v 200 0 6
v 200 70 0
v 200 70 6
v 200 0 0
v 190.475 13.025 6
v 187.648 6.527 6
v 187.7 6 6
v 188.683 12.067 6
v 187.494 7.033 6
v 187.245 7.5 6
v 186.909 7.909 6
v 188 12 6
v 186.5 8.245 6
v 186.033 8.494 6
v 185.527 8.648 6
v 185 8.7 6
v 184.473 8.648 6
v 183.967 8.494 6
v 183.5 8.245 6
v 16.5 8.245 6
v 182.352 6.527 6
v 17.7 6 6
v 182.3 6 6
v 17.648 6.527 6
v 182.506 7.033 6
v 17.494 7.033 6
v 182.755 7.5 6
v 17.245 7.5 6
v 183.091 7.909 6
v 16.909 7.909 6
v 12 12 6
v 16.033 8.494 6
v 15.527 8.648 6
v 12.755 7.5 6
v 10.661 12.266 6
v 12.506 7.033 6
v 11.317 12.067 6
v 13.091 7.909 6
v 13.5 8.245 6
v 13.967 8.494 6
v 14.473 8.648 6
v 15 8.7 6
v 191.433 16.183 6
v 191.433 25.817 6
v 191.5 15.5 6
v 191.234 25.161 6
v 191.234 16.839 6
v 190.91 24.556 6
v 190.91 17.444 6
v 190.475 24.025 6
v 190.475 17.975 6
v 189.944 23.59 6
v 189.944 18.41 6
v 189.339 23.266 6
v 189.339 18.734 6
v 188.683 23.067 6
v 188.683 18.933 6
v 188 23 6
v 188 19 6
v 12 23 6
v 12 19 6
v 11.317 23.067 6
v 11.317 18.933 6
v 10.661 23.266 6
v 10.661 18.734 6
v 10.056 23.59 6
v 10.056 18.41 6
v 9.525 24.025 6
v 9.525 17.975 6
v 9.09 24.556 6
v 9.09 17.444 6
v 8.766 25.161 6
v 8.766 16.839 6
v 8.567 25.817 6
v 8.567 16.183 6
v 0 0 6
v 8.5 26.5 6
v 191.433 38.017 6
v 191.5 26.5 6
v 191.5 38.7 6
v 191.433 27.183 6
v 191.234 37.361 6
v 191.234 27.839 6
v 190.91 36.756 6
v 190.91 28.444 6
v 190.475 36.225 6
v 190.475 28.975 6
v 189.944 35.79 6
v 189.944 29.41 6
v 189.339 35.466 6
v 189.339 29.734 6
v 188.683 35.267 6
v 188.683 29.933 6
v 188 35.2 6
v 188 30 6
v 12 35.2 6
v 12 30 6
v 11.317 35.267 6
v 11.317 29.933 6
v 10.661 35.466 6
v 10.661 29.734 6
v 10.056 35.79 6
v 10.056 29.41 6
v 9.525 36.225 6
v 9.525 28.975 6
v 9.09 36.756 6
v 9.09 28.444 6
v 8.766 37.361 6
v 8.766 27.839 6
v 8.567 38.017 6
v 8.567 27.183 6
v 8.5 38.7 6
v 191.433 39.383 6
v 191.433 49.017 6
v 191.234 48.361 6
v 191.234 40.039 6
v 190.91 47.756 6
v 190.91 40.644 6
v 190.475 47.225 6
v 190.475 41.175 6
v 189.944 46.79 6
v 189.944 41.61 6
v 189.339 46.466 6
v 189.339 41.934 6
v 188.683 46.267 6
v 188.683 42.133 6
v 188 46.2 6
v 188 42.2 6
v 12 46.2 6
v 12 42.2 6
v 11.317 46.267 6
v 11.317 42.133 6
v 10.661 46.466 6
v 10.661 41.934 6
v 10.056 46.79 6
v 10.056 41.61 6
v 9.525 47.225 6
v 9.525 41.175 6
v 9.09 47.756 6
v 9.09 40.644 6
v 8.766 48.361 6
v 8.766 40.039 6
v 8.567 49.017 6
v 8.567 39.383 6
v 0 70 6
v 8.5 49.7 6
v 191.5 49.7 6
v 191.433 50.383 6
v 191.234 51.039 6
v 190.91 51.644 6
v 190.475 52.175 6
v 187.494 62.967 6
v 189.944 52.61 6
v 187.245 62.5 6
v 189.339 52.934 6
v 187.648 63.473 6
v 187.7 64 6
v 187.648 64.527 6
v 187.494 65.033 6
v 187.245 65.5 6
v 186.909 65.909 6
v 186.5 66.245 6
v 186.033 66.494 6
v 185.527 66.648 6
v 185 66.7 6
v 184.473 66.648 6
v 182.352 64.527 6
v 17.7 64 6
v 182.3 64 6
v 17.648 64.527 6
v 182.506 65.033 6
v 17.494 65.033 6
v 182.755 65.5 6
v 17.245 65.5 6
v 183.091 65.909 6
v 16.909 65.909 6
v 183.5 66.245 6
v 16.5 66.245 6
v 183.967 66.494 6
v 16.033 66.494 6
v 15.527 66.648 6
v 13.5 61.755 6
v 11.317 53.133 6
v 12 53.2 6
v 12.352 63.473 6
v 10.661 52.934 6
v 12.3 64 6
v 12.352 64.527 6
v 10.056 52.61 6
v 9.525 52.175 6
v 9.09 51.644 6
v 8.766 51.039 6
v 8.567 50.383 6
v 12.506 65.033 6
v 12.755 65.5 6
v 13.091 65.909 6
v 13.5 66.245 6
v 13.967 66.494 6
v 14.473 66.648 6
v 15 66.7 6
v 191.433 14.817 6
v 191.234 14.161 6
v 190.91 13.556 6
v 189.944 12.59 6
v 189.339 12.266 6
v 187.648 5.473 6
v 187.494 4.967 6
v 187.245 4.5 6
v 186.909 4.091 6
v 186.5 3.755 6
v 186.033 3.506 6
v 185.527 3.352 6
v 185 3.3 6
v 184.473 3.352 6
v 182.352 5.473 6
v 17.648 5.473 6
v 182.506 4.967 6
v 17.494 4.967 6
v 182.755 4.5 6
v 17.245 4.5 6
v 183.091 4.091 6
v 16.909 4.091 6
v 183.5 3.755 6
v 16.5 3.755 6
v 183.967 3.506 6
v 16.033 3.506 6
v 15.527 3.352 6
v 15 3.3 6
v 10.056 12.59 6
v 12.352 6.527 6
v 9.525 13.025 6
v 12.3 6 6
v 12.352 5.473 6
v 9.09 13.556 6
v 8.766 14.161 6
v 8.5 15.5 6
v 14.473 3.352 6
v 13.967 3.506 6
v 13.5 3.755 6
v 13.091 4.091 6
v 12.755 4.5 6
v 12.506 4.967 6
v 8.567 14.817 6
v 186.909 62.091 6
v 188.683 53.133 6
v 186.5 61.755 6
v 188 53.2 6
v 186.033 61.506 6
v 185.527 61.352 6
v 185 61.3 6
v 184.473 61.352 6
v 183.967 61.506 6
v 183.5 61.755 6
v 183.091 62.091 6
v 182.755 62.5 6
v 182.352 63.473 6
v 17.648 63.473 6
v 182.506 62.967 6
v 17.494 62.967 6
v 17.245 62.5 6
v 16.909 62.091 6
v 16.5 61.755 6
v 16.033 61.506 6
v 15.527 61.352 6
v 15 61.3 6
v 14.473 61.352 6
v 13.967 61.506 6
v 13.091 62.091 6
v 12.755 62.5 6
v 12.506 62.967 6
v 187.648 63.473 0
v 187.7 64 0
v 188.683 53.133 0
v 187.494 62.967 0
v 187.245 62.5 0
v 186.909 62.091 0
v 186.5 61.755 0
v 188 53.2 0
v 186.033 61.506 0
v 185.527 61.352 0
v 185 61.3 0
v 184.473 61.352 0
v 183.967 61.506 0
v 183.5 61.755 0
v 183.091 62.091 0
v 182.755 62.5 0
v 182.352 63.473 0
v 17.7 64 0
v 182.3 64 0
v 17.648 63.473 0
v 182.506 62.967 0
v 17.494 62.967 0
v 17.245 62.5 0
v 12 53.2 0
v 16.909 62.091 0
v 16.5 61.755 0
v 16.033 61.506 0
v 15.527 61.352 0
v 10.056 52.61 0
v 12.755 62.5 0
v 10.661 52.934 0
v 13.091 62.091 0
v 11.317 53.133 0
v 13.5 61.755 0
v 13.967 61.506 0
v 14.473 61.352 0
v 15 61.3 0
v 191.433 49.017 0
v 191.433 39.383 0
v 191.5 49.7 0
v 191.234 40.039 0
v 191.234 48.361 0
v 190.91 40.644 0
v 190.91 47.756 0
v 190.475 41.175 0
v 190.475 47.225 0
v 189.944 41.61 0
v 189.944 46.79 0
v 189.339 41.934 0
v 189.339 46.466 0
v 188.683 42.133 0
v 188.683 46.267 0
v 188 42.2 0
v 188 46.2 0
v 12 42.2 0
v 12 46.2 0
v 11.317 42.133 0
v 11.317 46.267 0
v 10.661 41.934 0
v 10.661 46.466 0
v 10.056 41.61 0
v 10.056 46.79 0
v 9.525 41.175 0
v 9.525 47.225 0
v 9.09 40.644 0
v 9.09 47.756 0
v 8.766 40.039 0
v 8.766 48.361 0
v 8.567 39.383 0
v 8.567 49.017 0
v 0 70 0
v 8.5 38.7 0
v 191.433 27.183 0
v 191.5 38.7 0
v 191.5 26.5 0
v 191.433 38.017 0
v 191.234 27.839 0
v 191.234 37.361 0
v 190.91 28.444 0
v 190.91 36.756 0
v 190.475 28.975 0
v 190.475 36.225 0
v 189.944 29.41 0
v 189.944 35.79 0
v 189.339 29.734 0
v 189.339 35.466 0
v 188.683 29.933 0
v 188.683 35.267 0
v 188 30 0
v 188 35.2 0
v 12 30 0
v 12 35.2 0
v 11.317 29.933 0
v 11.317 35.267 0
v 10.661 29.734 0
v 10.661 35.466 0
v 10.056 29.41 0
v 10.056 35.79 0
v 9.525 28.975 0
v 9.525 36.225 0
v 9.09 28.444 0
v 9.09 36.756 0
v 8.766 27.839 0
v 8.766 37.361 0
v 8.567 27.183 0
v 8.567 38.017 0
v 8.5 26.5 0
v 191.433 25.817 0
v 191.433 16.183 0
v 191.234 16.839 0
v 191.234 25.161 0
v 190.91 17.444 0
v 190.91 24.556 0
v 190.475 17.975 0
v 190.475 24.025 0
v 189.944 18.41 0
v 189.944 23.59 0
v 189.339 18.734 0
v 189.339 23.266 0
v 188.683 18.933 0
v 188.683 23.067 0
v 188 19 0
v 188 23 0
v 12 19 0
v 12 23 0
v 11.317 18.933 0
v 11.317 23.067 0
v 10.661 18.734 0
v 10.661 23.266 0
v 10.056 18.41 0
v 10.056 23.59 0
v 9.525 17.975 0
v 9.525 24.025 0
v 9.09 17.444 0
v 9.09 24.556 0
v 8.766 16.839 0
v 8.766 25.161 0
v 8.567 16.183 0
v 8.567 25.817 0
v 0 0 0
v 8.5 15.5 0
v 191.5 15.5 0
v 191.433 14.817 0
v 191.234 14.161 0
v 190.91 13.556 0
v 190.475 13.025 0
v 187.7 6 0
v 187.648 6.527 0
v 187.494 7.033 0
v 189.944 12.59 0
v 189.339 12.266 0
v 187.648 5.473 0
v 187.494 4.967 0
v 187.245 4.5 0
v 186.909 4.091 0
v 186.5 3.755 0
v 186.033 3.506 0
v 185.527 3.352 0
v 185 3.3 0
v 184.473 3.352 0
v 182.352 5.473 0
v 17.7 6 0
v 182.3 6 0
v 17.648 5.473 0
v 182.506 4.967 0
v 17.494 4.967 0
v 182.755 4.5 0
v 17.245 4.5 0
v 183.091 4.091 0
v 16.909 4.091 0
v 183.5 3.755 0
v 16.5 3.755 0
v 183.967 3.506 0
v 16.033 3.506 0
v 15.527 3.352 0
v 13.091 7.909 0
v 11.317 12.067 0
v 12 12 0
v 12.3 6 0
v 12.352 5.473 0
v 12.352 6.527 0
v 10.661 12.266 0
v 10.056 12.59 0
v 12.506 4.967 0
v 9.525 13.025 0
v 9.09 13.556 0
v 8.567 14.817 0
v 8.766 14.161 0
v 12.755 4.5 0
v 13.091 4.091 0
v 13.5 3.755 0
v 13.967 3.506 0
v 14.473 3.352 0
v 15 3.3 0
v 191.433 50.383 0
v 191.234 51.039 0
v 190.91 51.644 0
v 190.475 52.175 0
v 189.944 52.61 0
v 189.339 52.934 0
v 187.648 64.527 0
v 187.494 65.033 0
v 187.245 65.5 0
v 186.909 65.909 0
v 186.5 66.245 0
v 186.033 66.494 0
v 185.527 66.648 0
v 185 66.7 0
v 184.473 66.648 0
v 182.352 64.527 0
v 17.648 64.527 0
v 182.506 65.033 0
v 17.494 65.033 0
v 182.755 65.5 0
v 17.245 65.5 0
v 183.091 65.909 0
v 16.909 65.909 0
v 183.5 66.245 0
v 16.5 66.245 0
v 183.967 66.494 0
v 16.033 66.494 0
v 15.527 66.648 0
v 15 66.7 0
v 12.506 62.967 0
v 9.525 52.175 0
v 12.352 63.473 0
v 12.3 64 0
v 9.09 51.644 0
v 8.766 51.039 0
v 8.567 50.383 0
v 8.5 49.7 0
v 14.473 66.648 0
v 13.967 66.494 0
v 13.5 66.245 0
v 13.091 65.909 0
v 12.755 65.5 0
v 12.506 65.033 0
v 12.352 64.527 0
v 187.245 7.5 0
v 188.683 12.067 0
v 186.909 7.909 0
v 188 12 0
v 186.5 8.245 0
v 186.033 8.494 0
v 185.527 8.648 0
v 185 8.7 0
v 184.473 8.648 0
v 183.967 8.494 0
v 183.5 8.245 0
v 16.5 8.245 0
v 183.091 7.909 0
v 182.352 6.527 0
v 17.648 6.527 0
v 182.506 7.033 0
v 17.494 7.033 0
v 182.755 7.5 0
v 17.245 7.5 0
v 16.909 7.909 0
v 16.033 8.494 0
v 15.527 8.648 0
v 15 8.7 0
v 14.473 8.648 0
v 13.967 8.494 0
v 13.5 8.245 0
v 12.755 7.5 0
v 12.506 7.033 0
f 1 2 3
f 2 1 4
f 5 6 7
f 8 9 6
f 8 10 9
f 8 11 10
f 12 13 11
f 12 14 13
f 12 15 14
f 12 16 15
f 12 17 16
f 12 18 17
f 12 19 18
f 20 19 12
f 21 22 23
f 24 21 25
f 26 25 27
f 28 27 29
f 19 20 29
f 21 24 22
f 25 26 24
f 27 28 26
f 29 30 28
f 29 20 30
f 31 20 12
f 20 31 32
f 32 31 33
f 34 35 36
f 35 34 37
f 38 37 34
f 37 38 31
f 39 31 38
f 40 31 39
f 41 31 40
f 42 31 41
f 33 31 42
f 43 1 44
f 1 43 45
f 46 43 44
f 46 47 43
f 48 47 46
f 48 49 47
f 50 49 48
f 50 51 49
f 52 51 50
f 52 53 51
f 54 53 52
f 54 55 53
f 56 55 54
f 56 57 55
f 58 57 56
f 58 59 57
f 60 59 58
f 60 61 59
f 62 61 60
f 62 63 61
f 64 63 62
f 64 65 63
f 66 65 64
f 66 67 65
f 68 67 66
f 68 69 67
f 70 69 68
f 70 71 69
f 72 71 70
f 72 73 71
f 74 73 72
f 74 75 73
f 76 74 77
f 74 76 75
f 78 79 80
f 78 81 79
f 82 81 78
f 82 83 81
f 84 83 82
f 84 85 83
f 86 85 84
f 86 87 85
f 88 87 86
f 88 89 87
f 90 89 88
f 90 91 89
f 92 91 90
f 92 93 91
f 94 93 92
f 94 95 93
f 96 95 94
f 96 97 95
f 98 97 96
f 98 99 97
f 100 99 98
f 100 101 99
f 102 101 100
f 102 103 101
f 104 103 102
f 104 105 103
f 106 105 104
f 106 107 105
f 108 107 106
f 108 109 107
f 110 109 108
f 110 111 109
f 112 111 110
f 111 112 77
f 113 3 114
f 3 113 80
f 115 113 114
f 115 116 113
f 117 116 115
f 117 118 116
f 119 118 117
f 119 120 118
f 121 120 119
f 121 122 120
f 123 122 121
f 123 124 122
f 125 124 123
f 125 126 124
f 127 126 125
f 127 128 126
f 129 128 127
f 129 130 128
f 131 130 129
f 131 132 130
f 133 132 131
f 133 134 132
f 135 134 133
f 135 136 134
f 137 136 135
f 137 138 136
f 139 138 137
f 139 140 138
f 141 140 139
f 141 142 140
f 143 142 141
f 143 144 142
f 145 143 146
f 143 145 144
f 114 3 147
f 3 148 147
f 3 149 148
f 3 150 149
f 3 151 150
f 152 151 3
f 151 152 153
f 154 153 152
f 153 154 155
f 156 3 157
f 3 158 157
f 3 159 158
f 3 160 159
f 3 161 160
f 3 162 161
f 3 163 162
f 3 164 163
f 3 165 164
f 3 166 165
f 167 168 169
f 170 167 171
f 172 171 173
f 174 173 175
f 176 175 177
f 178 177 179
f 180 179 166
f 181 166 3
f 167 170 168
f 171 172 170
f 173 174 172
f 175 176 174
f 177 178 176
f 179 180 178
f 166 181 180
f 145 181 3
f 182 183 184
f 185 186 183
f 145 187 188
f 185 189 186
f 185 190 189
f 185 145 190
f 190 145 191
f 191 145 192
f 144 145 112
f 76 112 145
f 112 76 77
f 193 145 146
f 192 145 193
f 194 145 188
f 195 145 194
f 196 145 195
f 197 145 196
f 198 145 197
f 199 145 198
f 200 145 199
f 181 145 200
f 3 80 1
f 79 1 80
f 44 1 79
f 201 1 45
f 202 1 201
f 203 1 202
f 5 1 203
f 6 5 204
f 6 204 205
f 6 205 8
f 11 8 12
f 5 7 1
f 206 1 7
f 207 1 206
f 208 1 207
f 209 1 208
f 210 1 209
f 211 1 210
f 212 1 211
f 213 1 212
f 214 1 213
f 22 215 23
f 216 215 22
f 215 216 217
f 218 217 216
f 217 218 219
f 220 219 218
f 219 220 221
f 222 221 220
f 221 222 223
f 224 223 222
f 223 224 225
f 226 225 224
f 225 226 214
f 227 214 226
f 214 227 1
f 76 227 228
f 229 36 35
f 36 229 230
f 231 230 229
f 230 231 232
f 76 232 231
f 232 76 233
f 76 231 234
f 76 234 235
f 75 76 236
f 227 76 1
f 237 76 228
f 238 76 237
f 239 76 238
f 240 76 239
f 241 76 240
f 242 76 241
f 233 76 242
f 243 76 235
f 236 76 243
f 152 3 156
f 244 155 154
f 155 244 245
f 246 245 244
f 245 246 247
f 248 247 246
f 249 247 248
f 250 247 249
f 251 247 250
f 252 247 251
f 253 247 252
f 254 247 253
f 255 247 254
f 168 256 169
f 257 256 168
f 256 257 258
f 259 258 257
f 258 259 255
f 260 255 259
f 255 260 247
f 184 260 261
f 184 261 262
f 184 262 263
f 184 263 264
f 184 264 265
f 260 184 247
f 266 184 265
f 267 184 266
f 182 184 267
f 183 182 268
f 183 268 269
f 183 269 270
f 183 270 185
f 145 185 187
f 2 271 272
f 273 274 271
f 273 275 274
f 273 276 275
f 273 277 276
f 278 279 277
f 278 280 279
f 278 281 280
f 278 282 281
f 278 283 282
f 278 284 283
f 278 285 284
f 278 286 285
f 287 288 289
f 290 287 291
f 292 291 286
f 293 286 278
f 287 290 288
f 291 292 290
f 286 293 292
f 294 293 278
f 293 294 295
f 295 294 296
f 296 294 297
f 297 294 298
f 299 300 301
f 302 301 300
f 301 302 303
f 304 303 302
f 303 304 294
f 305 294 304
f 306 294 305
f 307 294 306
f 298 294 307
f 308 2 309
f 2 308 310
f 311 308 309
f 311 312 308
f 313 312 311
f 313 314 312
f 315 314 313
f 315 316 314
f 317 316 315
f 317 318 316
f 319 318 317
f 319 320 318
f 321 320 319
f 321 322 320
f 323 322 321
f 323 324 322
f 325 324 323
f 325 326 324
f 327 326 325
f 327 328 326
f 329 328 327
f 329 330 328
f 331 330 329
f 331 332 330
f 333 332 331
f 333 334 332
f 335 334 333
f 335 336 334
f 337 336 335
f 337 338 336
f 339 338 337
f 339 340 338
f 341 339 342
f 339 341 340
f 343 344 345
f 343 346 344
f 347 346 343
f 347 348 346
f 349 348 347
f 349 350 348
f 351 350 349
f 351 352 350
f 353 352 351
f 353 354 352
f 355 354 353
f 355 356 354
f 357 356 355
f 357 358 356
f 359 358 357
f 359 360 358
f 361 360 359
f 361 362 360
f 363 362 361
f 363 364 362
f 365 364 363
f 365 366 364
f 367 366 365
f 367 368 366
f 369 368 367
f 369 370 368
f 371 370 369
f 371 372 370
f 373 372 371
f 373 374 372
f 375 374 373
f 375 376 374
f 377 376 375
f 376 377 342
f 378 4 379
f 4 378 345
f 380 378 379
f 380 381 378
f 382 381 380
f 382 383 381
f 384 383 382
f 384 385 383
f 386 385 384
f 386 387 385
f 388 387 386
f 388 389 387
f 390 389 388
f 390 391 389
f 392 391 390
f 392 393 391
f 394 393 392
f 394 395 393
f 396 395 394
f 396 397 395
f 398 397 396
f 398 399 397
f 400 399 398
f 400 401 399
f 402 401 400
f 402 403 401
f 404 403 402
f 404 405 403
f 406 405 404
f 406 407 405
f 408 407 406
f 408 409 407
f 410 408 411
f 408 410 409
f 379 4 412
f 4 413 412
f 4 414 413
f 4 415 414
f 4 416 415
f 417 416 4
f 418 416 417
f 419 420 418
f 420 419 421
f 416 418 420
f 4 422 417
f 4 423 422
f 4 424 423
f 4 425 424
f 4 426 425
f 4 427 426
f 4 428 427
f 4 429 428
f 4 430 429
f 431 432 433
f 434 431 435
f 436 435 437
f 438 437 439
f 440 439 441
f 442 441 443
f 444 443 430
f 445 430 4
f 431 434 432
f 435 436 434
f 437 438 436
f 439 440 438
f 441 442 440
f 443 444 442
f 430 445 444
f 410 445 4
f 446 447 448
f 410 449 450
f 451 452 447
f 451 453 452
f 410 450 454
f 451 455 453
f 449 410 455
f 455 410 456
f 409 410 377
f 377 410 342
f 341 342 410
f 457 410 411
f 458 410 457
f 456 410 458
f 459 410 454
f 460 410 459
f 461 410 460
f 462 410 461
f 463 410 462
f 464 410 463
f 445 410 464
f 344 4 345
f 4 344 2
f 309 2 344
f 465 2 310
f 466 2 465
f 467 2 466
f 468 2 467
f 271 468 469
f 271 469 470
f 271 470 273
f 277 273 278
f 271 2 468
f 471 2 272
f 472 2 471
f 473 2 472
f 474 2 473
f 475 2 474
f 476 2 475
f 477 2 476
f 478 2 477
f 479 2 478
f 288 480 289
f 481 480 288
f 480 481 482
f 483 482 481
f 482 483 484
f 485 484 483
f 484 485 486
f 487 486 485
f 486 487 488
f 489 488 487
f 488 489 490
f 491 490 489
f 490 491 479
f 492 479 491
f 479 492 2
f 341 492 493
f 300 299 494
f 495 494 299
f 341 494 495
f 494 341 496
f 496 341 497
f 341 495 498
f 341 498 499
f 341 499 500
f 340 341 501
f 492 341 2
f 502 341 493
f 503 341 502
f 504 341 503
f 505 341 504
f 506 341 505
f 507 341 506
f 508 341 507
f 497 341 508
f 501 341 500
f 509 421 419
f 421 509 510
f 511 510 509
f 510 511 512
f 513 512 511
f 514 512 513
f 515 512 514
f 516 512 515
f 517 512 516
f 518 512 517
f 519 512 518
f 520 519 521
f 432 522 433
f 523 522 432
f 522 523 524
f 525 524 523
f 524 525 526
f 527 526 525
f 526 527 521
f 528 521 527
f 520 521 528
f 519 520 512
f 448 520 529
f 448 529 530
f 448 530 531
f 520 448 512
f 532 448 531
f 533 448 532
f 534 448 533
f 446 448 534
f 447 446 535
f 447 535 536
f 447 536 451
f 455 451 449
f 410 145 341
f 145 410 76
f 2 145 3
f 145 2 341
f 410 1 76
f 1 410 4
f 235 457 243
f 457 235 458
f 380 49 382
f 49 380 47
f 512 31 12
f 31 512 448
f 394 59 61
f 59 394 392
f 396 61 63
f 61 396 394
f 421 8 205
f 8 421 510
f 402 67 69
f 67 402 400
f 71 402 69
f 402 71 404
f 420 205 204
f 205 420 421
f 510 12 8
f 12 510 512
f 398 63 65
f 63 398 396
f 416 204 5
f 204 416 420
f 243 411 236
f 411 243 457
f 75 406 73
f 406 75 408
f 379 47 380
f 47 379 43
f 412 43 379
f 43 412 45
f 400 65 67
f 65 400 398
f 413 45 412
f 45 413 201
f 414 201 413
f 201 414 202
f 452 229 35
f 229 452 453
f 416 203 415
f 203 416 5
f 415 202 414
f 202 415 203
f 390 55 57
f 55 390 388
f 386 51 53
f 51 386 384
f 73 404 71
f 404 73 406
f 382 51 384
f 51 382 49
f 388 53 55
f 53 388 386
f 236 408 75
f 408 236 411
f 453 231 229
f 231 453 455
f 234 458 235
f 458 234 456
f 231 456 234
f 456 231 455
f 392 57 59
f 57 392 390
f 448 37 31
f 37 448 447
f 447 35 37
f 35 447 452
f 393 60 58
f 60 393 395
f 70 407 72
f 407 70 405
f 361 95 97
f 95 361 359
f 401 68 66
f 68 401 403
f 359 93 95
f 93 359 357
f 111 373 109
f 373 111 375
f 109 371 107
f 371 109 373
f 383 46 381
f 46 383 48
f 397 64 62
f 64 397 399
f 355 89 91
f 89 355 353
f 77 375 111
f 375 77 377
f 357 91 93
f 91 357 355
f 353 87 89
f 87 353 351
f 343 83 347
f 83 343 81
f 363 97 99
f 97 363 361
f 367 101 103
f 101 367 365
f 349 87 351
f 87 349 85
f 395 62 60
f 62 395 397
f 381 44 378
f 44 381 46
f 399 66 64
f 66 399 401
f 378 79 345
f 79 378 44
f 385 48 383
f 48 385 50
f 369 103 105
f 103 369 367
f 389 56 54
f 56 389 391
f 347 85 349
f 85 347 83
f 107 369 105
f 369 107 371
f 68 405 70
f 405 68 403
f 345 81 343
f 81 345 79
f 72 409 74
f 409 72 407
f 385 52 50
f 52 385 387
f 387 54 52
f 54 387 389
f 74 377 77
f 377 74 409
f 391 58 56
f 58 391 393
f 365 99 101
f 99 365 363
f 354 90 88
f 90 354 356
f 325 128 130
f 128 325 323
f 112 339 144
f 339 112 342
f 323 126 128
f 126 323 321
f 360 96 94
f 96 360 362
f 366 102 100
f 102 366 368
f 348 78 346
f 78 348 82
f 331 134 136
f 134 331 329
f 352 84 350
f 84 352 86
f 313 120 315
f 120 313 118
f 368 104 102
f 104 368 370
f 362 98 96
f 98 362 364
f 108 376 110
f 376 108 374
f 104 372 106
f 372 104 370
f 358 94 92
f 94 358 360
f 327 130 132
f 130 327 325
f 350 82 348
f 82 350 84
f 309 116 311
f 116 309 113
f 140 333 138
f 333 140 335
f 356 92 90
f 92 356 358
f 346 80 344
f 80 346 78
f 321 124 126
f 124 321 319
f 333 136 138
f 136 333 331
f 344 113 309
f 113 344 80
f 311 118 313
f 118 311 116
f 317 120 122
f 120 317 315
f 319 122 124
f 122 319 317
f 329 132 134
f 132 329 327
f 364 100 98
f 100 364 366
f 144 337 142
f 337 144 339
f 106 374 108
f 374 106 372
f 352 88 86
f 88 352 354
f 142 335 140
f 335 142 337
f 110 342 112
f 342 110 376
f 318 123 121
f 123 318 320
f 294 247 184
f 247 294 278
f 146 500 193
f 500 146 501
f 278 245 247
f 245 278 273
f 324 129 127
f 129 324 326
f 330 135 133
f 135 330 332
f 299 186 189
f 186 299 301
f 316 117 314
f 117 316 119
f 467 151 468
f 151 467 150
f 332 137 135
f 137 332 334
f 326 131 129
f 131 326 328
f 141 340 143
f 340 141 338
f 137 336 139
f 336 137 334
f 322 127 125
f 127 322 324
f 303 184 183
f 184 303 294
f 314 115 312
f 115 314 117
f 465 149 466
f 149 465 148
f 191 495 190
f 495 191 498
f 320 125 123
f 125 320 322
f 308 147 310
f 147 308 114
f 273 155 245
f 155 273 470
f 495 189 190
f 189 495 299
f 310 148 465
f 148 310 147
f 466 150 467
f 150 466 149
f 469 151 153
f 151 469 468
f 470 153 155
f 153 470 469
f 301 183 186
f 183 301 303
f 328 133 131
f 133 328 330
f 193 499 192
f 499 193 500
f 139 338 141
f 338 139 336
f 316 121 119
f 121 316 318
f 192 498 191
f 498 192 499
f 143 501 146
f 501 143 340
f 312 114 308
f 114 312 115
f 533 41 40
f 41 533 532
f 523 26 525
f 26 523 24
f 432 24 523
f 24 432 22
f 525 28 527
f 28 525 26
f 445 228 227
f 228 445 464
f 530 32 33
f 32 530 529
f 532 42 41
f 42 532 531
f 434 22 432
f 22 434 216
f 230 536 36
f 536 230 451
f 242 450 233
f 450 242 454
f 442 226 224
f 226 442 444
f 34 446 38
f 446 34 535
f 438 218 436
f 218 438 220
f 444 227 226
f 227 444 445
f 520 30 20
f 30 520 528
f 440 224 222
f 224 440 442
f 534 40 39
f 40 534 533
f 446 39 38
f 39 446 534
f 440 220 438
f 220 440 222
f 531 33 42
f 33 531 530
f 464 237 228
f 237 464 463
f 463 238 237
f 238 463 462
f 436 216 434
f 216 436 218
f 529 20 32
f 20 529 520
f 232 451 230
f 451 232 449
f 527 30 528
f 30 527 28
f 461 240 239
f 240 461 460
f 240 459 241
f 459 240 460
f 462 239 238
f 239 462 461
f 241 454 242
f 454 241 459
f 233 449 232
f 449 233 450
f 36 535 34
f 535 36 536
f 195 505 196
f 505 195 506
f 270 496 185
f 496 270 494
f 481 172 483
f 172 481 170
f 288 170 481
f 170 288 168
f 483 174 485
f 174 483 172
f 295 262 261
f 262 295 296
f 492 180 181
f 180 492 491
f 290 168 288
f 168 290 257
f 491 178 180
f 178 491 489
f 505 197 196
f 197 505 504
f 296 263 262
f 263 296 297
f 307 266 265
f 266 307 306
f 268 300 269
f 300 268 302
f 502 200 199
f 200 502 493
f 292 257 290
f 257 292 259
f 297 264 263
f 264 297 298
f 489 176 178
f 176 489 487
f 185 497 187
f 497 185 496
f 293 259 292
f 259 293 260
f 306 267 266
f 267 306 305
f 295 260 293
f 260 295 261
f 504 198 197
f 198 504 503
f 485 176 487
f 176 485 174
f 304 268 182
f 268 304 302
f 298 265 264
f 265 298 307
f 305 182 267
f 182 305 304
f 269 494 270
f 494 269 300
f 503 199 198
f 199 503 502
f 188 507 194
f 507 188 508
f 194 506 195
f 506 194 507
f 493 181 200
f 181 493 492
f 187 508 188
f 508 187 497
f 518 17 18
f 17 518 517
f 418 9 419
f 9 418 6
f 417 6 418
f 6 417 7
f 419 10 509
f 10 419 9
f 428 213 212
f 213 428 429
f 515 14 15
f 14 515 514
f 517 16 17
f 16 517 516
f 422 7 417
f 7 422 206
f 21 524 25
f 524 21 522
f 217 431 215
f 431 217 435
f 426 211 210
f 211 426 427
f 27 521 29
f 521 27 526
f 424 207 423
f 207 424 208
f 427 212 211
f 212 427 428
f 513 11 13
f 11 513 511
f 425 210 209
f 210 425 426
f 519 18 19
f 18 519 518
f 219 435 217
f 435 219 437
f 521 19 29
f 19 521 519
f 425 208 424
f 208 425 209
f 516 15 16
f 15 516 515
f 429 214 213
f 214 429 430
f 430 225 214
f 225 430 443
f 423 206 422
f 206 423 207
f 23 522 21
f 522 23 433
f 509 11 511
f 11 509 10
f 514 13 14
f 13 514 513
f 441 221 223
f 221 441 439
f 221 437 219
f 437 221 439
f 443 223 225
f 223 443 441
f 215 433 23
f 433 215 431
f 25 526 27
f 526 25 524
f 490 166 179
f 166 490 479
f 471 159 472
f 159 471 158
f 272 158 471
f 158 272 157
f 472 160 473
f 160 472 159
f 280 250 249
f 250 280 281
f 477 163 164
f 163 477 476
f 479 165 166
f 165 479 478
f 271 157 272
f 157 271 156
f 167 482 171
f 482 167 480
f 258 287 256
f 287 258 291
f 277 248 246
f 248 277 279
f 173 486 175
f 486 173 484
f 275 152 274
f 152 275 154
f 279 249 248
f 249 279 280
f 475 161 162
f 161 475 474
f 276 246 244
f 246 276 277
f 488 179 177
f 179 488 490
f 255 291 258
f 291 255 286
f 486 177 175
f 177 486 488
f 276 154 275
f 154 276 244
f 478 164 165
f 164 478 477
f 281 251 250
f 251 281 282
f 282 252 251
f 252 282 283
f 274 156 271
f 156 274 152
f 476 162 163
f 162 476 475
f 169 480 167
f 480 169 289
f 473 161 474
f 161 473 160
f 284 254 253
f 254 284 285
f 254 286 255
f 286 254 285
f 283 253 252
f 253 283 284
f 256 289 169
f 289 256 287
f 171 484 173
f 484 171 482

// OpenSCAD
$fn = 32;

// ----------------------------------------------------------------------
// Slotted panel: 200 x 70 mm, 4 ряда of slots
// ----------------------------------------------------------------------

// --- parameters (mm) ---
panel_w = 200;            // panel width
panel_d = 70;             // panel depth
thick = 6;                // panel thickness
slot_w = 7;               // slot width
pitch0 = 11;              // first row pitch
pitch_step = 1.2;         // pitch increase per row
margin = 12;              // margin around the slot field
rows = 4;                 // number of slot rows
mount_d = 5.4;            // mounting holes
mount_x = 85;             // mounting hole offset

difference() {
  union() {
    cube([panel_w, panel_d, thick]);
  }
  /* slot rows: stadium shaped cutters, 2.5 mm clear of both faces */
  /* row 0: pitch 11, length 176 */
  hull() {
    translate([12, 15.5, -2.5]) cylinder(h = thick + 5, d = slot_w);
    translate([188, 15.5, -2.5]) cylinder(h = thick + 5, d = slot_w);
  }
  /* row 1: pitch 12.2, length 176 */
  hull() {
    translate([12, 26.5, -2.5]) cylinder(h = thick + 5, d = slot_w);
    translate([188, 26.5, -2.5]) cylinder(h = thick + 5, d = slot_w);
  }
  /* row 2: pitch 11, length 176 */
  hull() {
    translate([12, 38.7, -2.5]) cylinder(h = thick + 5, d = slot_w);
    translate([188, 38.7, -2.5]) cylinder(h = thick + 5, d = slot_w);
  }
  /* row 3: pitch 12.2, length 176 */
  hull() {
    translate([12, 49.7, -2.5]) cylinder(h = thick + 5, d = slot_w);
    translate([188, 49.7, -2.5]) cylinder(h = thick + 5, d = slot_w);
  }
  translate([15, 6, -2.5]) cylinder(h = 11, d = mount_d);
  translate([15, 64, -2.5]) cylinder(h = 11, d = mount_d);
  translate([185, 6, -2.5]) cylinder(h = 11, d = mount_d);
  translate([185, 64, -2.5]) cylinder(h = 11, d = mount_d);
}
